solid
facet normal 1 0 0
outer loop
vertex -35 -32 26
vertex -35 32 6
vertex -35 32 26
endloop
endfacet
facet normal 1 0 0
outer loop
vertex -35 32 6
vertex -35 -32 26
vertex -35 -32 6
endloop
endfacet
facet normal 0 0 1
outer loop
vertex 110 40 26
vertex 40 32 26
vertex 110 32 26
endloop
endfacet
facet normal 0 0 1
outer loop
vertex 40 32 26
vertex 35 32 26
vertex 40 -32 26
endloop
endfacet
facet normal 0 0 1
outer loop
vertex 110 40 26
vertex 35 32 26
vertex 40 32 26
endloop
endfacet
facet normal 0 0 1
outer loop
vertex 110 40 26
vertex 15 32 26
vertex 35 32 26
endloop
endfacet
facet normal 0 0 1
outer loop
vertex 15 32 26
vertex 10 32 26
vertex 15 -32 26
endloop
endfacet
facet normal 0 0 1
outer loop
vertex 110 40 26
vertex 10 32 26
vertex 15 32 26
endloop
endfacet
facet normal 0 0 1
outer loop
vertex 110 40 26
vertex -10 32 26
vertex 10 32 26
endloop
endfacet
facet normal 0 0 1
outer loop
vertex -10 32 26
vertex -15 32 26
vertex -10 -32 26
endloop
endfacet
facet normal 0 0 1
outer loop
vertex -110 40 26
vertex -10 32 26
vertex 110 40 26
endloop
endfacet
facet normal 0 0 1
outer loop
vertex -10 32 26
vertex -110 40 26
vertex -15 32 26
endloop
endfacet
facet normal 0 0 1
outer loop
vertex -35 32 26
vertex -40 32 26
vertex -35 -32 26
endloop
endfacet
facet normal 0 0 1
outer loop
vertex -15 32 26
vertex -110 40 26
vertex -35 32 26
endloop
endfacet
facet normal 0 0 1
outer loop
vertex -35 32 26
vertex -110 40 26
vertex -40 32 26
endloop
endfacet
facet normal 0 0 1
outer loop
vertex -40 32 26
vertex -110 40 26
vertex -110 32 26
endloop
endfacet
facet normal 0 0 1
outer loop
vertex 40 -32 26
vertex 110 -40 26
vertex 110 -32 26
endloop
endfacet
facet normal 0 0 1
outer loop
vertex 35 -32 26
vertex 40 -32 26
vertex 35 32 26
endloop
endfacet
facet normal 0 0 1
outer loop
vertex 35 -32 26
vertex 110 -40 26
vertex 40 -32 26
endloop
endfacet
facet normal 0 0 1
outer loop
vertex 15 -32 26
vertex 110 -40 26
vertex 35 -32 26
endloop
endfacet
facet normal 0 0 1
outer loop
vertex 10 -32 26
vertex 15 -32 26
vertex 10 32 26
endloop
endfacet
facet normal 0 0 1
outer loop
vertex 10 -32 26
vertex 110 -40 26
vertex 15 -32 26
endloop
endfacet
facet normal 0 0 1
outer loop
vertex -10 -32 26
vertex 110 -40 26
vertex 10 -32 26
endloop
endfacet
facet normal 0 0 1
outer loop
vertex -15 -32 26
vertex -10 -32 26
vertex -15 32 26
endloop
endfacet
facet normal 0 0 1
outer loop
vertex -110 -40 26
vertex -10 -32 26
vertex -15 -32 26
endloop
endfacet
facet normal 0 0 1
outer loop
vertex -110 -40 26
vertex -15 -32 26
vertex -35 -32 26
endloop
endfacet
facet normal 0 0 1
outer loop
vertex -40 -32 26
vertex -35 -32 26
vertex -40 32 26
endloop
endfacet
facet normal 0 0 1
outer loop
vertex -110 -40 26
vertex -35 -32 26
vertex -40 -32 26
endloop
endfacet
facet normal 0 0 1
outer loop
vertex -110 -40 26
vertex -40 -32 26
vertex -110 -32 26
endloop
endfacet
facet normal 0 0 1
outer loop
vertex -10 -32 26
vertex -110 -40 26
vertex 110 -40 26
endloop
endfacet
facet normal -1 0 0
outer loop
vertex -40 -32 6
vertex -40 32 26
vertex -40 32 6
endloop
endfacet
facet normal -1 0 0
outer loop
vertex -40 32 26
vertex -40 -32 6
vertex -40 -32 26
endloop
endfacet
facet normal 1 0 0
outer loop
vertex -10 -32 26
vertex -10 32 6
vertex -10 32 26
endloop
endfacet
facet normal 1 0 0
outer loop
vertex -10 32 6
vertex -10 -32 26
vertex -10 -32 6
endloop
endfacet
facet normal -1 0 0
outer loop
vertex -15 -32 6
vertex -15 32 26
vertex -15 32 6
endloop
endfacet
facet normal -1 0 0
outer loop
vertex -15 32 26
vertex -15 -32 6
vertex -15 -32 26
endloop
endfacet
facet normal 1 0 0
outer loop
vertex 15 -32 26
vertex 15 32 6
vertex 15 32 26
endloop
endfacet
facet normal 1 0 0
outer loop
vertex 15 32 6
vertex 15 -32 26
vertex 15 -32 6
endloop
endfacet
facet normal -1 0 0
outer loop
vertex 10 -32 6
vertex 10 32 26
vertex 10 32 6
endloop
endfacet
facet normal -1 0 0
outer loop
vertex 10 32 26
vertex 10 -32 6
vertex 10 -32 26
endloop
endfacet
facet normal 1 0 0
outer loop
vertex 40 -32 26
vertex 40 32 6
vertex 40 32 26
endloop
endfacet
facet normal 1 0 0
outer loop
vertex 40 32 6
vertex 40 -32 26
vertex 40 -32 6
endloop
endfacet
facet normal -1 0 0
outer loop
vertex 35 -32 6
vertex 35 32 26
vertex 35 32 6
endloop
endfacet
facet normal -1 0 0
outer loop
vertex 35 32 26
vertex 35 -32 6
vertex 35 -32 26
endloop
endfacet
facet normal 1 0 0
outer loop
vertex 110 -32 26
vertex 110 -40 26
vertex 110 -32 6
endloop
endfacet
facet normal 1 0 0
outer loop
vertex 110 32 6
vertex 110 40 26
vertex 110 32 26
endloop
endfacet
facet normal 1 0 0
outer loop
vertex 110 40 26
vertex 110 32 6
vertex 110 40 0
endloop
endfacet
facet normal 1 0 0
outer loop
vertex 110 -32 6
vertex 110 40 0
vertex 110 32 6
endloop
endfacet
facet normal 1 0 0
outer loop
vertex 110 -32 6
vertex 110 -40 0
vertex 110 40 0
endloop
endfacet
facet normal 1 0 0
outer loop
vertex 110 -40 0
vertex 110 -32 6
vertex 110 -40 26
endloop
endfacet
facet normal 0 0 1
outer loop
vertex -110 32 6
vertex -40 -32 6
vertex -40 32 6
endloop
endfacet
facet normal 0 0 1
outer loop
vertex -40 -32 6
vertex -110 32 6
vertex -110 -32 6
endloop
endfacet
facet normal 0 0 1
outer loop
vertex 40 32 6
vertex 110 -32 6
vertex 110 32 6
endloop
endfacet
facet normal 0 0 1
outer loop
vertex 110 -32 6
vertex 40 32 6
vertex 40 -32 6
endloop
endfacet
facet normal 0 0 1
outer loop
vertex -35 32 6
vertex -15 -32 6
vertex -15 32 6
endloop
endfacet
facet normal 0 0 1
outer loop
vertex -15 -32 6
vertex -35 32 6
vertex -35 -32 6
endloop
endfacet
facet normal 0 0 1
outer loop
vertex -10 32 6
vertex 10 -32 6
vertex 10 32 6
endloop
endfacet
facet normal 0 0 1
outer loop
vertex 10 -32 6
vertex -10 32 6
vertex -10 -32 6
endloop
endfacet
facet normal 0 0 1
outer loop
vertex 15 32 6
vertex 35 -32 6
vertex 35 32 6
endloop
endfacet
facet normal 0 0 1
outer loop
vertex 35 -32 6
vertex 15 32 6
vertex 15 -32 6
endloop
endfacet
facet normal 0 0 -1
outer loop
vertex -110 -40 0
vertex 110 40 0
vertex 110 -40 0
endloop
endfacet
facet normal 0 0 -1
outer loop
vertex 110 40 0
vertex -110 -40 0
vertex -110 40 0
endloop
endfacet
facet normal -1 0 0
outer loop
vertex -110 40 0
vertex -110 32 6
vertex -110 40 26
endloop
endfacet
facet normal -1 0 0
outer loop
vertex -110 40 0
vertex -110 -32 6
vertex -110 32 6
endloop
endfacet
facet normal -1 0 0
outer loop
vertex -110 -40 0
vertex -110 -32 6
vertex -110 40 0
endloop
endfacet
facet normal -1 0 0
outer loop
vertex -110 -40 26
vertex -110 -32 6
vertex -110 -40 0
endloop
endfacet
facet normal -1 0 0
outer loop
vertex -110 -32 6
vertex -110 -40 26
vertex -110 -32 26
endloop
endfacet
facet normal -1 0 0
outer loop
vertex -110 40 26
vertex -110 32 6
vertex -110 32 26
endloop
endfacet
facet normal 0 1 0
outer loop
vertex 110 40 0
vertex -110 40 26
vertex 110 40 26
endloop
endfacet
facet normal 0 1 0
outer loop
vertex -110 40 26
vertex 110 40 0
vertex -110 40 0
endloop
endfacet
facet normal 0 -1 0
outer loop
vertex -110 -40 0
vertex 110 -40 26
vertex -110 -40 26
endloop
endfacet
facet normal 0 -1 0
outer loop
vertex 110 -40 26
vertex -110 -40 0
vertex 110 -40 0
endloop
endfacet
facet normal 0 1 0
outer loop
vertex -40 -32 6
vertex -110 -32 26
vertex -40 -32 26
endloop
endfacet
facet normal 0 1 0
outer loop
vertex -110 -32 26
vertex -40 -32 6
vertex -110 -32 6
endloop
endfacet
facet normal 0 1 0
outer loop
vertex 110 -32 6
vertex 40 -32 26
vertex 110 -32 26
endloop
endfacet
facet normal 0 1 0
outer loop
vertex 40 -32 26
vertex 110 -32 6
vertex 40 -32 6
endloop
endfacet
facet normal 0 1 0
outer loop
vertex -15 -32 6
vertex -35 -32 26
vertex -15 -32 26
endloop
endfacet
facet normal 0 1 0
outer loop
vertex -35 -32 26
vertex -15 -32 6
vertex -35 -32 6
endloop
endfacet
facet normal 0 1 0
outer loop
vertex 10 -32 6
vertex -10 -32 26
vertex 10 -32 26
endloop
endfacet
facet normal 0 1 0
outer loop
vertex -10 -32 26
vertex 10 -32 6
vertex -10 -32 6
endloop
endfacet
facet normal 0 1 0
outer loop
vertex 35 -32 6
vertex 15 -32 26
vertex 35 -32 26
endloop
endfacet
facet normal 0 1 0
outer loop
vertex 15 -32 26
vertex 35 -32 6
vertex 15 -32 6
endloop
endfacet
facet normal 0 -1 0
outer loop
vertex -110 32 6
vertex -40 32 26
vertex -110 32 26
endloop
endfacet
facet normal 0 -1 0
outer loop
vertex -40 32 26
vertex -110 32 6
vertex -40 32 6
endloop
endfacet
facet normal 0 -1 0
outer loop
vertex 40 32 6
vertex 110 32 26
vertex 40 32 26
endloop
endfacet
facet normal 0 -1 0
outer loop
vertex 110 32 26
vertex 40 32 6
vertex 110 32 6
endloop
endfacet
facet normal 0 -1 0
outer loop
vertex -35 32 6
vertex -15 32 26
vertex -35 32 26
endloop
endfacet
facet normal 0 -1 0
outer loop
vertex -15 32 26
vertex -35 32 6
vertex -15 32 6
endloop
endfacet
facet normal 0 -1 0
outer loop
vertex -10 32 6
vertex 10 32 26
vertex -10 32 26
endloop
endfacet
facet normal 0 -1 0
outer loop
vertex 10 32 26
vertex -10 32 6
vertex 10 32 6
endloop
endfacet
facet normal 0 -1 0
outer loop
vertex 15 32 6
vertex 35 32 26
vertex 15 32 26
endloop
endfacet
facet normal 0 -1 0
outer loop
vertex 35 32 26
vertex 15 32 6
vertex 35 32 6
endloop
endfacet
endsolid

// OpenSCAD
$fn = 32;

// ----------------------------------------------------------------------
// Rib frame 220 x 80 x 26
// 4 ribs at 25 mm pitch
// ----------------------------------------------------------------------

// --- parameters (mm) ---
frame = [220, 80, 6];  // base plate size (x, y, z)
rail_w = 8;            // side rail width
ribs = 4;              // number of ribs
rib_t = 5;             // rib thickness
rib_h = 20;            // rib height above the base plate
pitch = 25;            // pitch between rib centres

// --- derived feature positions (mm) ---
span = (ribs - 1) * pitch;          // = 75   distance between the outer ribs
origin_x = -span / 2;               // = -37.5   X of the first rib
rib_len = frame[1] - 2 * rail_w + 2;  // = 66   rib length, 1 mm into each rail
feature_centers = [
  [origin_x + 0 * pitch, 0],
  [origin_x + 1 * pitch, 0],
  [origin_x + 2 * pitch, 0],
  [origin_x + 3 * pitch, 0]
];   // rib centre line, drives the rib loop

// base plate, two side rails, then the ribs read straight off feature_centers
union() {
  translate([-frame[0] / 2, -frame[1] / 2, 0]) cube(frame);
  translate([-frame[0] / 2, -frame[1] / 2, 0]) cube([frame[0], rail_w, frame[2] + rib_h]);
  translate([-frame[0] / 2, frame[1] / 2 - rail_w, 0]) cube([frame[0], rail_w, frame[2] + rib_h]);
  for (centre = feature_centers)
    translate([centre[0] - rib_t / 2, centre[1] - rib_len / 2, frame[2] - 1])
      cube([rib_t, rib_len, rib_h + 1]);
}
